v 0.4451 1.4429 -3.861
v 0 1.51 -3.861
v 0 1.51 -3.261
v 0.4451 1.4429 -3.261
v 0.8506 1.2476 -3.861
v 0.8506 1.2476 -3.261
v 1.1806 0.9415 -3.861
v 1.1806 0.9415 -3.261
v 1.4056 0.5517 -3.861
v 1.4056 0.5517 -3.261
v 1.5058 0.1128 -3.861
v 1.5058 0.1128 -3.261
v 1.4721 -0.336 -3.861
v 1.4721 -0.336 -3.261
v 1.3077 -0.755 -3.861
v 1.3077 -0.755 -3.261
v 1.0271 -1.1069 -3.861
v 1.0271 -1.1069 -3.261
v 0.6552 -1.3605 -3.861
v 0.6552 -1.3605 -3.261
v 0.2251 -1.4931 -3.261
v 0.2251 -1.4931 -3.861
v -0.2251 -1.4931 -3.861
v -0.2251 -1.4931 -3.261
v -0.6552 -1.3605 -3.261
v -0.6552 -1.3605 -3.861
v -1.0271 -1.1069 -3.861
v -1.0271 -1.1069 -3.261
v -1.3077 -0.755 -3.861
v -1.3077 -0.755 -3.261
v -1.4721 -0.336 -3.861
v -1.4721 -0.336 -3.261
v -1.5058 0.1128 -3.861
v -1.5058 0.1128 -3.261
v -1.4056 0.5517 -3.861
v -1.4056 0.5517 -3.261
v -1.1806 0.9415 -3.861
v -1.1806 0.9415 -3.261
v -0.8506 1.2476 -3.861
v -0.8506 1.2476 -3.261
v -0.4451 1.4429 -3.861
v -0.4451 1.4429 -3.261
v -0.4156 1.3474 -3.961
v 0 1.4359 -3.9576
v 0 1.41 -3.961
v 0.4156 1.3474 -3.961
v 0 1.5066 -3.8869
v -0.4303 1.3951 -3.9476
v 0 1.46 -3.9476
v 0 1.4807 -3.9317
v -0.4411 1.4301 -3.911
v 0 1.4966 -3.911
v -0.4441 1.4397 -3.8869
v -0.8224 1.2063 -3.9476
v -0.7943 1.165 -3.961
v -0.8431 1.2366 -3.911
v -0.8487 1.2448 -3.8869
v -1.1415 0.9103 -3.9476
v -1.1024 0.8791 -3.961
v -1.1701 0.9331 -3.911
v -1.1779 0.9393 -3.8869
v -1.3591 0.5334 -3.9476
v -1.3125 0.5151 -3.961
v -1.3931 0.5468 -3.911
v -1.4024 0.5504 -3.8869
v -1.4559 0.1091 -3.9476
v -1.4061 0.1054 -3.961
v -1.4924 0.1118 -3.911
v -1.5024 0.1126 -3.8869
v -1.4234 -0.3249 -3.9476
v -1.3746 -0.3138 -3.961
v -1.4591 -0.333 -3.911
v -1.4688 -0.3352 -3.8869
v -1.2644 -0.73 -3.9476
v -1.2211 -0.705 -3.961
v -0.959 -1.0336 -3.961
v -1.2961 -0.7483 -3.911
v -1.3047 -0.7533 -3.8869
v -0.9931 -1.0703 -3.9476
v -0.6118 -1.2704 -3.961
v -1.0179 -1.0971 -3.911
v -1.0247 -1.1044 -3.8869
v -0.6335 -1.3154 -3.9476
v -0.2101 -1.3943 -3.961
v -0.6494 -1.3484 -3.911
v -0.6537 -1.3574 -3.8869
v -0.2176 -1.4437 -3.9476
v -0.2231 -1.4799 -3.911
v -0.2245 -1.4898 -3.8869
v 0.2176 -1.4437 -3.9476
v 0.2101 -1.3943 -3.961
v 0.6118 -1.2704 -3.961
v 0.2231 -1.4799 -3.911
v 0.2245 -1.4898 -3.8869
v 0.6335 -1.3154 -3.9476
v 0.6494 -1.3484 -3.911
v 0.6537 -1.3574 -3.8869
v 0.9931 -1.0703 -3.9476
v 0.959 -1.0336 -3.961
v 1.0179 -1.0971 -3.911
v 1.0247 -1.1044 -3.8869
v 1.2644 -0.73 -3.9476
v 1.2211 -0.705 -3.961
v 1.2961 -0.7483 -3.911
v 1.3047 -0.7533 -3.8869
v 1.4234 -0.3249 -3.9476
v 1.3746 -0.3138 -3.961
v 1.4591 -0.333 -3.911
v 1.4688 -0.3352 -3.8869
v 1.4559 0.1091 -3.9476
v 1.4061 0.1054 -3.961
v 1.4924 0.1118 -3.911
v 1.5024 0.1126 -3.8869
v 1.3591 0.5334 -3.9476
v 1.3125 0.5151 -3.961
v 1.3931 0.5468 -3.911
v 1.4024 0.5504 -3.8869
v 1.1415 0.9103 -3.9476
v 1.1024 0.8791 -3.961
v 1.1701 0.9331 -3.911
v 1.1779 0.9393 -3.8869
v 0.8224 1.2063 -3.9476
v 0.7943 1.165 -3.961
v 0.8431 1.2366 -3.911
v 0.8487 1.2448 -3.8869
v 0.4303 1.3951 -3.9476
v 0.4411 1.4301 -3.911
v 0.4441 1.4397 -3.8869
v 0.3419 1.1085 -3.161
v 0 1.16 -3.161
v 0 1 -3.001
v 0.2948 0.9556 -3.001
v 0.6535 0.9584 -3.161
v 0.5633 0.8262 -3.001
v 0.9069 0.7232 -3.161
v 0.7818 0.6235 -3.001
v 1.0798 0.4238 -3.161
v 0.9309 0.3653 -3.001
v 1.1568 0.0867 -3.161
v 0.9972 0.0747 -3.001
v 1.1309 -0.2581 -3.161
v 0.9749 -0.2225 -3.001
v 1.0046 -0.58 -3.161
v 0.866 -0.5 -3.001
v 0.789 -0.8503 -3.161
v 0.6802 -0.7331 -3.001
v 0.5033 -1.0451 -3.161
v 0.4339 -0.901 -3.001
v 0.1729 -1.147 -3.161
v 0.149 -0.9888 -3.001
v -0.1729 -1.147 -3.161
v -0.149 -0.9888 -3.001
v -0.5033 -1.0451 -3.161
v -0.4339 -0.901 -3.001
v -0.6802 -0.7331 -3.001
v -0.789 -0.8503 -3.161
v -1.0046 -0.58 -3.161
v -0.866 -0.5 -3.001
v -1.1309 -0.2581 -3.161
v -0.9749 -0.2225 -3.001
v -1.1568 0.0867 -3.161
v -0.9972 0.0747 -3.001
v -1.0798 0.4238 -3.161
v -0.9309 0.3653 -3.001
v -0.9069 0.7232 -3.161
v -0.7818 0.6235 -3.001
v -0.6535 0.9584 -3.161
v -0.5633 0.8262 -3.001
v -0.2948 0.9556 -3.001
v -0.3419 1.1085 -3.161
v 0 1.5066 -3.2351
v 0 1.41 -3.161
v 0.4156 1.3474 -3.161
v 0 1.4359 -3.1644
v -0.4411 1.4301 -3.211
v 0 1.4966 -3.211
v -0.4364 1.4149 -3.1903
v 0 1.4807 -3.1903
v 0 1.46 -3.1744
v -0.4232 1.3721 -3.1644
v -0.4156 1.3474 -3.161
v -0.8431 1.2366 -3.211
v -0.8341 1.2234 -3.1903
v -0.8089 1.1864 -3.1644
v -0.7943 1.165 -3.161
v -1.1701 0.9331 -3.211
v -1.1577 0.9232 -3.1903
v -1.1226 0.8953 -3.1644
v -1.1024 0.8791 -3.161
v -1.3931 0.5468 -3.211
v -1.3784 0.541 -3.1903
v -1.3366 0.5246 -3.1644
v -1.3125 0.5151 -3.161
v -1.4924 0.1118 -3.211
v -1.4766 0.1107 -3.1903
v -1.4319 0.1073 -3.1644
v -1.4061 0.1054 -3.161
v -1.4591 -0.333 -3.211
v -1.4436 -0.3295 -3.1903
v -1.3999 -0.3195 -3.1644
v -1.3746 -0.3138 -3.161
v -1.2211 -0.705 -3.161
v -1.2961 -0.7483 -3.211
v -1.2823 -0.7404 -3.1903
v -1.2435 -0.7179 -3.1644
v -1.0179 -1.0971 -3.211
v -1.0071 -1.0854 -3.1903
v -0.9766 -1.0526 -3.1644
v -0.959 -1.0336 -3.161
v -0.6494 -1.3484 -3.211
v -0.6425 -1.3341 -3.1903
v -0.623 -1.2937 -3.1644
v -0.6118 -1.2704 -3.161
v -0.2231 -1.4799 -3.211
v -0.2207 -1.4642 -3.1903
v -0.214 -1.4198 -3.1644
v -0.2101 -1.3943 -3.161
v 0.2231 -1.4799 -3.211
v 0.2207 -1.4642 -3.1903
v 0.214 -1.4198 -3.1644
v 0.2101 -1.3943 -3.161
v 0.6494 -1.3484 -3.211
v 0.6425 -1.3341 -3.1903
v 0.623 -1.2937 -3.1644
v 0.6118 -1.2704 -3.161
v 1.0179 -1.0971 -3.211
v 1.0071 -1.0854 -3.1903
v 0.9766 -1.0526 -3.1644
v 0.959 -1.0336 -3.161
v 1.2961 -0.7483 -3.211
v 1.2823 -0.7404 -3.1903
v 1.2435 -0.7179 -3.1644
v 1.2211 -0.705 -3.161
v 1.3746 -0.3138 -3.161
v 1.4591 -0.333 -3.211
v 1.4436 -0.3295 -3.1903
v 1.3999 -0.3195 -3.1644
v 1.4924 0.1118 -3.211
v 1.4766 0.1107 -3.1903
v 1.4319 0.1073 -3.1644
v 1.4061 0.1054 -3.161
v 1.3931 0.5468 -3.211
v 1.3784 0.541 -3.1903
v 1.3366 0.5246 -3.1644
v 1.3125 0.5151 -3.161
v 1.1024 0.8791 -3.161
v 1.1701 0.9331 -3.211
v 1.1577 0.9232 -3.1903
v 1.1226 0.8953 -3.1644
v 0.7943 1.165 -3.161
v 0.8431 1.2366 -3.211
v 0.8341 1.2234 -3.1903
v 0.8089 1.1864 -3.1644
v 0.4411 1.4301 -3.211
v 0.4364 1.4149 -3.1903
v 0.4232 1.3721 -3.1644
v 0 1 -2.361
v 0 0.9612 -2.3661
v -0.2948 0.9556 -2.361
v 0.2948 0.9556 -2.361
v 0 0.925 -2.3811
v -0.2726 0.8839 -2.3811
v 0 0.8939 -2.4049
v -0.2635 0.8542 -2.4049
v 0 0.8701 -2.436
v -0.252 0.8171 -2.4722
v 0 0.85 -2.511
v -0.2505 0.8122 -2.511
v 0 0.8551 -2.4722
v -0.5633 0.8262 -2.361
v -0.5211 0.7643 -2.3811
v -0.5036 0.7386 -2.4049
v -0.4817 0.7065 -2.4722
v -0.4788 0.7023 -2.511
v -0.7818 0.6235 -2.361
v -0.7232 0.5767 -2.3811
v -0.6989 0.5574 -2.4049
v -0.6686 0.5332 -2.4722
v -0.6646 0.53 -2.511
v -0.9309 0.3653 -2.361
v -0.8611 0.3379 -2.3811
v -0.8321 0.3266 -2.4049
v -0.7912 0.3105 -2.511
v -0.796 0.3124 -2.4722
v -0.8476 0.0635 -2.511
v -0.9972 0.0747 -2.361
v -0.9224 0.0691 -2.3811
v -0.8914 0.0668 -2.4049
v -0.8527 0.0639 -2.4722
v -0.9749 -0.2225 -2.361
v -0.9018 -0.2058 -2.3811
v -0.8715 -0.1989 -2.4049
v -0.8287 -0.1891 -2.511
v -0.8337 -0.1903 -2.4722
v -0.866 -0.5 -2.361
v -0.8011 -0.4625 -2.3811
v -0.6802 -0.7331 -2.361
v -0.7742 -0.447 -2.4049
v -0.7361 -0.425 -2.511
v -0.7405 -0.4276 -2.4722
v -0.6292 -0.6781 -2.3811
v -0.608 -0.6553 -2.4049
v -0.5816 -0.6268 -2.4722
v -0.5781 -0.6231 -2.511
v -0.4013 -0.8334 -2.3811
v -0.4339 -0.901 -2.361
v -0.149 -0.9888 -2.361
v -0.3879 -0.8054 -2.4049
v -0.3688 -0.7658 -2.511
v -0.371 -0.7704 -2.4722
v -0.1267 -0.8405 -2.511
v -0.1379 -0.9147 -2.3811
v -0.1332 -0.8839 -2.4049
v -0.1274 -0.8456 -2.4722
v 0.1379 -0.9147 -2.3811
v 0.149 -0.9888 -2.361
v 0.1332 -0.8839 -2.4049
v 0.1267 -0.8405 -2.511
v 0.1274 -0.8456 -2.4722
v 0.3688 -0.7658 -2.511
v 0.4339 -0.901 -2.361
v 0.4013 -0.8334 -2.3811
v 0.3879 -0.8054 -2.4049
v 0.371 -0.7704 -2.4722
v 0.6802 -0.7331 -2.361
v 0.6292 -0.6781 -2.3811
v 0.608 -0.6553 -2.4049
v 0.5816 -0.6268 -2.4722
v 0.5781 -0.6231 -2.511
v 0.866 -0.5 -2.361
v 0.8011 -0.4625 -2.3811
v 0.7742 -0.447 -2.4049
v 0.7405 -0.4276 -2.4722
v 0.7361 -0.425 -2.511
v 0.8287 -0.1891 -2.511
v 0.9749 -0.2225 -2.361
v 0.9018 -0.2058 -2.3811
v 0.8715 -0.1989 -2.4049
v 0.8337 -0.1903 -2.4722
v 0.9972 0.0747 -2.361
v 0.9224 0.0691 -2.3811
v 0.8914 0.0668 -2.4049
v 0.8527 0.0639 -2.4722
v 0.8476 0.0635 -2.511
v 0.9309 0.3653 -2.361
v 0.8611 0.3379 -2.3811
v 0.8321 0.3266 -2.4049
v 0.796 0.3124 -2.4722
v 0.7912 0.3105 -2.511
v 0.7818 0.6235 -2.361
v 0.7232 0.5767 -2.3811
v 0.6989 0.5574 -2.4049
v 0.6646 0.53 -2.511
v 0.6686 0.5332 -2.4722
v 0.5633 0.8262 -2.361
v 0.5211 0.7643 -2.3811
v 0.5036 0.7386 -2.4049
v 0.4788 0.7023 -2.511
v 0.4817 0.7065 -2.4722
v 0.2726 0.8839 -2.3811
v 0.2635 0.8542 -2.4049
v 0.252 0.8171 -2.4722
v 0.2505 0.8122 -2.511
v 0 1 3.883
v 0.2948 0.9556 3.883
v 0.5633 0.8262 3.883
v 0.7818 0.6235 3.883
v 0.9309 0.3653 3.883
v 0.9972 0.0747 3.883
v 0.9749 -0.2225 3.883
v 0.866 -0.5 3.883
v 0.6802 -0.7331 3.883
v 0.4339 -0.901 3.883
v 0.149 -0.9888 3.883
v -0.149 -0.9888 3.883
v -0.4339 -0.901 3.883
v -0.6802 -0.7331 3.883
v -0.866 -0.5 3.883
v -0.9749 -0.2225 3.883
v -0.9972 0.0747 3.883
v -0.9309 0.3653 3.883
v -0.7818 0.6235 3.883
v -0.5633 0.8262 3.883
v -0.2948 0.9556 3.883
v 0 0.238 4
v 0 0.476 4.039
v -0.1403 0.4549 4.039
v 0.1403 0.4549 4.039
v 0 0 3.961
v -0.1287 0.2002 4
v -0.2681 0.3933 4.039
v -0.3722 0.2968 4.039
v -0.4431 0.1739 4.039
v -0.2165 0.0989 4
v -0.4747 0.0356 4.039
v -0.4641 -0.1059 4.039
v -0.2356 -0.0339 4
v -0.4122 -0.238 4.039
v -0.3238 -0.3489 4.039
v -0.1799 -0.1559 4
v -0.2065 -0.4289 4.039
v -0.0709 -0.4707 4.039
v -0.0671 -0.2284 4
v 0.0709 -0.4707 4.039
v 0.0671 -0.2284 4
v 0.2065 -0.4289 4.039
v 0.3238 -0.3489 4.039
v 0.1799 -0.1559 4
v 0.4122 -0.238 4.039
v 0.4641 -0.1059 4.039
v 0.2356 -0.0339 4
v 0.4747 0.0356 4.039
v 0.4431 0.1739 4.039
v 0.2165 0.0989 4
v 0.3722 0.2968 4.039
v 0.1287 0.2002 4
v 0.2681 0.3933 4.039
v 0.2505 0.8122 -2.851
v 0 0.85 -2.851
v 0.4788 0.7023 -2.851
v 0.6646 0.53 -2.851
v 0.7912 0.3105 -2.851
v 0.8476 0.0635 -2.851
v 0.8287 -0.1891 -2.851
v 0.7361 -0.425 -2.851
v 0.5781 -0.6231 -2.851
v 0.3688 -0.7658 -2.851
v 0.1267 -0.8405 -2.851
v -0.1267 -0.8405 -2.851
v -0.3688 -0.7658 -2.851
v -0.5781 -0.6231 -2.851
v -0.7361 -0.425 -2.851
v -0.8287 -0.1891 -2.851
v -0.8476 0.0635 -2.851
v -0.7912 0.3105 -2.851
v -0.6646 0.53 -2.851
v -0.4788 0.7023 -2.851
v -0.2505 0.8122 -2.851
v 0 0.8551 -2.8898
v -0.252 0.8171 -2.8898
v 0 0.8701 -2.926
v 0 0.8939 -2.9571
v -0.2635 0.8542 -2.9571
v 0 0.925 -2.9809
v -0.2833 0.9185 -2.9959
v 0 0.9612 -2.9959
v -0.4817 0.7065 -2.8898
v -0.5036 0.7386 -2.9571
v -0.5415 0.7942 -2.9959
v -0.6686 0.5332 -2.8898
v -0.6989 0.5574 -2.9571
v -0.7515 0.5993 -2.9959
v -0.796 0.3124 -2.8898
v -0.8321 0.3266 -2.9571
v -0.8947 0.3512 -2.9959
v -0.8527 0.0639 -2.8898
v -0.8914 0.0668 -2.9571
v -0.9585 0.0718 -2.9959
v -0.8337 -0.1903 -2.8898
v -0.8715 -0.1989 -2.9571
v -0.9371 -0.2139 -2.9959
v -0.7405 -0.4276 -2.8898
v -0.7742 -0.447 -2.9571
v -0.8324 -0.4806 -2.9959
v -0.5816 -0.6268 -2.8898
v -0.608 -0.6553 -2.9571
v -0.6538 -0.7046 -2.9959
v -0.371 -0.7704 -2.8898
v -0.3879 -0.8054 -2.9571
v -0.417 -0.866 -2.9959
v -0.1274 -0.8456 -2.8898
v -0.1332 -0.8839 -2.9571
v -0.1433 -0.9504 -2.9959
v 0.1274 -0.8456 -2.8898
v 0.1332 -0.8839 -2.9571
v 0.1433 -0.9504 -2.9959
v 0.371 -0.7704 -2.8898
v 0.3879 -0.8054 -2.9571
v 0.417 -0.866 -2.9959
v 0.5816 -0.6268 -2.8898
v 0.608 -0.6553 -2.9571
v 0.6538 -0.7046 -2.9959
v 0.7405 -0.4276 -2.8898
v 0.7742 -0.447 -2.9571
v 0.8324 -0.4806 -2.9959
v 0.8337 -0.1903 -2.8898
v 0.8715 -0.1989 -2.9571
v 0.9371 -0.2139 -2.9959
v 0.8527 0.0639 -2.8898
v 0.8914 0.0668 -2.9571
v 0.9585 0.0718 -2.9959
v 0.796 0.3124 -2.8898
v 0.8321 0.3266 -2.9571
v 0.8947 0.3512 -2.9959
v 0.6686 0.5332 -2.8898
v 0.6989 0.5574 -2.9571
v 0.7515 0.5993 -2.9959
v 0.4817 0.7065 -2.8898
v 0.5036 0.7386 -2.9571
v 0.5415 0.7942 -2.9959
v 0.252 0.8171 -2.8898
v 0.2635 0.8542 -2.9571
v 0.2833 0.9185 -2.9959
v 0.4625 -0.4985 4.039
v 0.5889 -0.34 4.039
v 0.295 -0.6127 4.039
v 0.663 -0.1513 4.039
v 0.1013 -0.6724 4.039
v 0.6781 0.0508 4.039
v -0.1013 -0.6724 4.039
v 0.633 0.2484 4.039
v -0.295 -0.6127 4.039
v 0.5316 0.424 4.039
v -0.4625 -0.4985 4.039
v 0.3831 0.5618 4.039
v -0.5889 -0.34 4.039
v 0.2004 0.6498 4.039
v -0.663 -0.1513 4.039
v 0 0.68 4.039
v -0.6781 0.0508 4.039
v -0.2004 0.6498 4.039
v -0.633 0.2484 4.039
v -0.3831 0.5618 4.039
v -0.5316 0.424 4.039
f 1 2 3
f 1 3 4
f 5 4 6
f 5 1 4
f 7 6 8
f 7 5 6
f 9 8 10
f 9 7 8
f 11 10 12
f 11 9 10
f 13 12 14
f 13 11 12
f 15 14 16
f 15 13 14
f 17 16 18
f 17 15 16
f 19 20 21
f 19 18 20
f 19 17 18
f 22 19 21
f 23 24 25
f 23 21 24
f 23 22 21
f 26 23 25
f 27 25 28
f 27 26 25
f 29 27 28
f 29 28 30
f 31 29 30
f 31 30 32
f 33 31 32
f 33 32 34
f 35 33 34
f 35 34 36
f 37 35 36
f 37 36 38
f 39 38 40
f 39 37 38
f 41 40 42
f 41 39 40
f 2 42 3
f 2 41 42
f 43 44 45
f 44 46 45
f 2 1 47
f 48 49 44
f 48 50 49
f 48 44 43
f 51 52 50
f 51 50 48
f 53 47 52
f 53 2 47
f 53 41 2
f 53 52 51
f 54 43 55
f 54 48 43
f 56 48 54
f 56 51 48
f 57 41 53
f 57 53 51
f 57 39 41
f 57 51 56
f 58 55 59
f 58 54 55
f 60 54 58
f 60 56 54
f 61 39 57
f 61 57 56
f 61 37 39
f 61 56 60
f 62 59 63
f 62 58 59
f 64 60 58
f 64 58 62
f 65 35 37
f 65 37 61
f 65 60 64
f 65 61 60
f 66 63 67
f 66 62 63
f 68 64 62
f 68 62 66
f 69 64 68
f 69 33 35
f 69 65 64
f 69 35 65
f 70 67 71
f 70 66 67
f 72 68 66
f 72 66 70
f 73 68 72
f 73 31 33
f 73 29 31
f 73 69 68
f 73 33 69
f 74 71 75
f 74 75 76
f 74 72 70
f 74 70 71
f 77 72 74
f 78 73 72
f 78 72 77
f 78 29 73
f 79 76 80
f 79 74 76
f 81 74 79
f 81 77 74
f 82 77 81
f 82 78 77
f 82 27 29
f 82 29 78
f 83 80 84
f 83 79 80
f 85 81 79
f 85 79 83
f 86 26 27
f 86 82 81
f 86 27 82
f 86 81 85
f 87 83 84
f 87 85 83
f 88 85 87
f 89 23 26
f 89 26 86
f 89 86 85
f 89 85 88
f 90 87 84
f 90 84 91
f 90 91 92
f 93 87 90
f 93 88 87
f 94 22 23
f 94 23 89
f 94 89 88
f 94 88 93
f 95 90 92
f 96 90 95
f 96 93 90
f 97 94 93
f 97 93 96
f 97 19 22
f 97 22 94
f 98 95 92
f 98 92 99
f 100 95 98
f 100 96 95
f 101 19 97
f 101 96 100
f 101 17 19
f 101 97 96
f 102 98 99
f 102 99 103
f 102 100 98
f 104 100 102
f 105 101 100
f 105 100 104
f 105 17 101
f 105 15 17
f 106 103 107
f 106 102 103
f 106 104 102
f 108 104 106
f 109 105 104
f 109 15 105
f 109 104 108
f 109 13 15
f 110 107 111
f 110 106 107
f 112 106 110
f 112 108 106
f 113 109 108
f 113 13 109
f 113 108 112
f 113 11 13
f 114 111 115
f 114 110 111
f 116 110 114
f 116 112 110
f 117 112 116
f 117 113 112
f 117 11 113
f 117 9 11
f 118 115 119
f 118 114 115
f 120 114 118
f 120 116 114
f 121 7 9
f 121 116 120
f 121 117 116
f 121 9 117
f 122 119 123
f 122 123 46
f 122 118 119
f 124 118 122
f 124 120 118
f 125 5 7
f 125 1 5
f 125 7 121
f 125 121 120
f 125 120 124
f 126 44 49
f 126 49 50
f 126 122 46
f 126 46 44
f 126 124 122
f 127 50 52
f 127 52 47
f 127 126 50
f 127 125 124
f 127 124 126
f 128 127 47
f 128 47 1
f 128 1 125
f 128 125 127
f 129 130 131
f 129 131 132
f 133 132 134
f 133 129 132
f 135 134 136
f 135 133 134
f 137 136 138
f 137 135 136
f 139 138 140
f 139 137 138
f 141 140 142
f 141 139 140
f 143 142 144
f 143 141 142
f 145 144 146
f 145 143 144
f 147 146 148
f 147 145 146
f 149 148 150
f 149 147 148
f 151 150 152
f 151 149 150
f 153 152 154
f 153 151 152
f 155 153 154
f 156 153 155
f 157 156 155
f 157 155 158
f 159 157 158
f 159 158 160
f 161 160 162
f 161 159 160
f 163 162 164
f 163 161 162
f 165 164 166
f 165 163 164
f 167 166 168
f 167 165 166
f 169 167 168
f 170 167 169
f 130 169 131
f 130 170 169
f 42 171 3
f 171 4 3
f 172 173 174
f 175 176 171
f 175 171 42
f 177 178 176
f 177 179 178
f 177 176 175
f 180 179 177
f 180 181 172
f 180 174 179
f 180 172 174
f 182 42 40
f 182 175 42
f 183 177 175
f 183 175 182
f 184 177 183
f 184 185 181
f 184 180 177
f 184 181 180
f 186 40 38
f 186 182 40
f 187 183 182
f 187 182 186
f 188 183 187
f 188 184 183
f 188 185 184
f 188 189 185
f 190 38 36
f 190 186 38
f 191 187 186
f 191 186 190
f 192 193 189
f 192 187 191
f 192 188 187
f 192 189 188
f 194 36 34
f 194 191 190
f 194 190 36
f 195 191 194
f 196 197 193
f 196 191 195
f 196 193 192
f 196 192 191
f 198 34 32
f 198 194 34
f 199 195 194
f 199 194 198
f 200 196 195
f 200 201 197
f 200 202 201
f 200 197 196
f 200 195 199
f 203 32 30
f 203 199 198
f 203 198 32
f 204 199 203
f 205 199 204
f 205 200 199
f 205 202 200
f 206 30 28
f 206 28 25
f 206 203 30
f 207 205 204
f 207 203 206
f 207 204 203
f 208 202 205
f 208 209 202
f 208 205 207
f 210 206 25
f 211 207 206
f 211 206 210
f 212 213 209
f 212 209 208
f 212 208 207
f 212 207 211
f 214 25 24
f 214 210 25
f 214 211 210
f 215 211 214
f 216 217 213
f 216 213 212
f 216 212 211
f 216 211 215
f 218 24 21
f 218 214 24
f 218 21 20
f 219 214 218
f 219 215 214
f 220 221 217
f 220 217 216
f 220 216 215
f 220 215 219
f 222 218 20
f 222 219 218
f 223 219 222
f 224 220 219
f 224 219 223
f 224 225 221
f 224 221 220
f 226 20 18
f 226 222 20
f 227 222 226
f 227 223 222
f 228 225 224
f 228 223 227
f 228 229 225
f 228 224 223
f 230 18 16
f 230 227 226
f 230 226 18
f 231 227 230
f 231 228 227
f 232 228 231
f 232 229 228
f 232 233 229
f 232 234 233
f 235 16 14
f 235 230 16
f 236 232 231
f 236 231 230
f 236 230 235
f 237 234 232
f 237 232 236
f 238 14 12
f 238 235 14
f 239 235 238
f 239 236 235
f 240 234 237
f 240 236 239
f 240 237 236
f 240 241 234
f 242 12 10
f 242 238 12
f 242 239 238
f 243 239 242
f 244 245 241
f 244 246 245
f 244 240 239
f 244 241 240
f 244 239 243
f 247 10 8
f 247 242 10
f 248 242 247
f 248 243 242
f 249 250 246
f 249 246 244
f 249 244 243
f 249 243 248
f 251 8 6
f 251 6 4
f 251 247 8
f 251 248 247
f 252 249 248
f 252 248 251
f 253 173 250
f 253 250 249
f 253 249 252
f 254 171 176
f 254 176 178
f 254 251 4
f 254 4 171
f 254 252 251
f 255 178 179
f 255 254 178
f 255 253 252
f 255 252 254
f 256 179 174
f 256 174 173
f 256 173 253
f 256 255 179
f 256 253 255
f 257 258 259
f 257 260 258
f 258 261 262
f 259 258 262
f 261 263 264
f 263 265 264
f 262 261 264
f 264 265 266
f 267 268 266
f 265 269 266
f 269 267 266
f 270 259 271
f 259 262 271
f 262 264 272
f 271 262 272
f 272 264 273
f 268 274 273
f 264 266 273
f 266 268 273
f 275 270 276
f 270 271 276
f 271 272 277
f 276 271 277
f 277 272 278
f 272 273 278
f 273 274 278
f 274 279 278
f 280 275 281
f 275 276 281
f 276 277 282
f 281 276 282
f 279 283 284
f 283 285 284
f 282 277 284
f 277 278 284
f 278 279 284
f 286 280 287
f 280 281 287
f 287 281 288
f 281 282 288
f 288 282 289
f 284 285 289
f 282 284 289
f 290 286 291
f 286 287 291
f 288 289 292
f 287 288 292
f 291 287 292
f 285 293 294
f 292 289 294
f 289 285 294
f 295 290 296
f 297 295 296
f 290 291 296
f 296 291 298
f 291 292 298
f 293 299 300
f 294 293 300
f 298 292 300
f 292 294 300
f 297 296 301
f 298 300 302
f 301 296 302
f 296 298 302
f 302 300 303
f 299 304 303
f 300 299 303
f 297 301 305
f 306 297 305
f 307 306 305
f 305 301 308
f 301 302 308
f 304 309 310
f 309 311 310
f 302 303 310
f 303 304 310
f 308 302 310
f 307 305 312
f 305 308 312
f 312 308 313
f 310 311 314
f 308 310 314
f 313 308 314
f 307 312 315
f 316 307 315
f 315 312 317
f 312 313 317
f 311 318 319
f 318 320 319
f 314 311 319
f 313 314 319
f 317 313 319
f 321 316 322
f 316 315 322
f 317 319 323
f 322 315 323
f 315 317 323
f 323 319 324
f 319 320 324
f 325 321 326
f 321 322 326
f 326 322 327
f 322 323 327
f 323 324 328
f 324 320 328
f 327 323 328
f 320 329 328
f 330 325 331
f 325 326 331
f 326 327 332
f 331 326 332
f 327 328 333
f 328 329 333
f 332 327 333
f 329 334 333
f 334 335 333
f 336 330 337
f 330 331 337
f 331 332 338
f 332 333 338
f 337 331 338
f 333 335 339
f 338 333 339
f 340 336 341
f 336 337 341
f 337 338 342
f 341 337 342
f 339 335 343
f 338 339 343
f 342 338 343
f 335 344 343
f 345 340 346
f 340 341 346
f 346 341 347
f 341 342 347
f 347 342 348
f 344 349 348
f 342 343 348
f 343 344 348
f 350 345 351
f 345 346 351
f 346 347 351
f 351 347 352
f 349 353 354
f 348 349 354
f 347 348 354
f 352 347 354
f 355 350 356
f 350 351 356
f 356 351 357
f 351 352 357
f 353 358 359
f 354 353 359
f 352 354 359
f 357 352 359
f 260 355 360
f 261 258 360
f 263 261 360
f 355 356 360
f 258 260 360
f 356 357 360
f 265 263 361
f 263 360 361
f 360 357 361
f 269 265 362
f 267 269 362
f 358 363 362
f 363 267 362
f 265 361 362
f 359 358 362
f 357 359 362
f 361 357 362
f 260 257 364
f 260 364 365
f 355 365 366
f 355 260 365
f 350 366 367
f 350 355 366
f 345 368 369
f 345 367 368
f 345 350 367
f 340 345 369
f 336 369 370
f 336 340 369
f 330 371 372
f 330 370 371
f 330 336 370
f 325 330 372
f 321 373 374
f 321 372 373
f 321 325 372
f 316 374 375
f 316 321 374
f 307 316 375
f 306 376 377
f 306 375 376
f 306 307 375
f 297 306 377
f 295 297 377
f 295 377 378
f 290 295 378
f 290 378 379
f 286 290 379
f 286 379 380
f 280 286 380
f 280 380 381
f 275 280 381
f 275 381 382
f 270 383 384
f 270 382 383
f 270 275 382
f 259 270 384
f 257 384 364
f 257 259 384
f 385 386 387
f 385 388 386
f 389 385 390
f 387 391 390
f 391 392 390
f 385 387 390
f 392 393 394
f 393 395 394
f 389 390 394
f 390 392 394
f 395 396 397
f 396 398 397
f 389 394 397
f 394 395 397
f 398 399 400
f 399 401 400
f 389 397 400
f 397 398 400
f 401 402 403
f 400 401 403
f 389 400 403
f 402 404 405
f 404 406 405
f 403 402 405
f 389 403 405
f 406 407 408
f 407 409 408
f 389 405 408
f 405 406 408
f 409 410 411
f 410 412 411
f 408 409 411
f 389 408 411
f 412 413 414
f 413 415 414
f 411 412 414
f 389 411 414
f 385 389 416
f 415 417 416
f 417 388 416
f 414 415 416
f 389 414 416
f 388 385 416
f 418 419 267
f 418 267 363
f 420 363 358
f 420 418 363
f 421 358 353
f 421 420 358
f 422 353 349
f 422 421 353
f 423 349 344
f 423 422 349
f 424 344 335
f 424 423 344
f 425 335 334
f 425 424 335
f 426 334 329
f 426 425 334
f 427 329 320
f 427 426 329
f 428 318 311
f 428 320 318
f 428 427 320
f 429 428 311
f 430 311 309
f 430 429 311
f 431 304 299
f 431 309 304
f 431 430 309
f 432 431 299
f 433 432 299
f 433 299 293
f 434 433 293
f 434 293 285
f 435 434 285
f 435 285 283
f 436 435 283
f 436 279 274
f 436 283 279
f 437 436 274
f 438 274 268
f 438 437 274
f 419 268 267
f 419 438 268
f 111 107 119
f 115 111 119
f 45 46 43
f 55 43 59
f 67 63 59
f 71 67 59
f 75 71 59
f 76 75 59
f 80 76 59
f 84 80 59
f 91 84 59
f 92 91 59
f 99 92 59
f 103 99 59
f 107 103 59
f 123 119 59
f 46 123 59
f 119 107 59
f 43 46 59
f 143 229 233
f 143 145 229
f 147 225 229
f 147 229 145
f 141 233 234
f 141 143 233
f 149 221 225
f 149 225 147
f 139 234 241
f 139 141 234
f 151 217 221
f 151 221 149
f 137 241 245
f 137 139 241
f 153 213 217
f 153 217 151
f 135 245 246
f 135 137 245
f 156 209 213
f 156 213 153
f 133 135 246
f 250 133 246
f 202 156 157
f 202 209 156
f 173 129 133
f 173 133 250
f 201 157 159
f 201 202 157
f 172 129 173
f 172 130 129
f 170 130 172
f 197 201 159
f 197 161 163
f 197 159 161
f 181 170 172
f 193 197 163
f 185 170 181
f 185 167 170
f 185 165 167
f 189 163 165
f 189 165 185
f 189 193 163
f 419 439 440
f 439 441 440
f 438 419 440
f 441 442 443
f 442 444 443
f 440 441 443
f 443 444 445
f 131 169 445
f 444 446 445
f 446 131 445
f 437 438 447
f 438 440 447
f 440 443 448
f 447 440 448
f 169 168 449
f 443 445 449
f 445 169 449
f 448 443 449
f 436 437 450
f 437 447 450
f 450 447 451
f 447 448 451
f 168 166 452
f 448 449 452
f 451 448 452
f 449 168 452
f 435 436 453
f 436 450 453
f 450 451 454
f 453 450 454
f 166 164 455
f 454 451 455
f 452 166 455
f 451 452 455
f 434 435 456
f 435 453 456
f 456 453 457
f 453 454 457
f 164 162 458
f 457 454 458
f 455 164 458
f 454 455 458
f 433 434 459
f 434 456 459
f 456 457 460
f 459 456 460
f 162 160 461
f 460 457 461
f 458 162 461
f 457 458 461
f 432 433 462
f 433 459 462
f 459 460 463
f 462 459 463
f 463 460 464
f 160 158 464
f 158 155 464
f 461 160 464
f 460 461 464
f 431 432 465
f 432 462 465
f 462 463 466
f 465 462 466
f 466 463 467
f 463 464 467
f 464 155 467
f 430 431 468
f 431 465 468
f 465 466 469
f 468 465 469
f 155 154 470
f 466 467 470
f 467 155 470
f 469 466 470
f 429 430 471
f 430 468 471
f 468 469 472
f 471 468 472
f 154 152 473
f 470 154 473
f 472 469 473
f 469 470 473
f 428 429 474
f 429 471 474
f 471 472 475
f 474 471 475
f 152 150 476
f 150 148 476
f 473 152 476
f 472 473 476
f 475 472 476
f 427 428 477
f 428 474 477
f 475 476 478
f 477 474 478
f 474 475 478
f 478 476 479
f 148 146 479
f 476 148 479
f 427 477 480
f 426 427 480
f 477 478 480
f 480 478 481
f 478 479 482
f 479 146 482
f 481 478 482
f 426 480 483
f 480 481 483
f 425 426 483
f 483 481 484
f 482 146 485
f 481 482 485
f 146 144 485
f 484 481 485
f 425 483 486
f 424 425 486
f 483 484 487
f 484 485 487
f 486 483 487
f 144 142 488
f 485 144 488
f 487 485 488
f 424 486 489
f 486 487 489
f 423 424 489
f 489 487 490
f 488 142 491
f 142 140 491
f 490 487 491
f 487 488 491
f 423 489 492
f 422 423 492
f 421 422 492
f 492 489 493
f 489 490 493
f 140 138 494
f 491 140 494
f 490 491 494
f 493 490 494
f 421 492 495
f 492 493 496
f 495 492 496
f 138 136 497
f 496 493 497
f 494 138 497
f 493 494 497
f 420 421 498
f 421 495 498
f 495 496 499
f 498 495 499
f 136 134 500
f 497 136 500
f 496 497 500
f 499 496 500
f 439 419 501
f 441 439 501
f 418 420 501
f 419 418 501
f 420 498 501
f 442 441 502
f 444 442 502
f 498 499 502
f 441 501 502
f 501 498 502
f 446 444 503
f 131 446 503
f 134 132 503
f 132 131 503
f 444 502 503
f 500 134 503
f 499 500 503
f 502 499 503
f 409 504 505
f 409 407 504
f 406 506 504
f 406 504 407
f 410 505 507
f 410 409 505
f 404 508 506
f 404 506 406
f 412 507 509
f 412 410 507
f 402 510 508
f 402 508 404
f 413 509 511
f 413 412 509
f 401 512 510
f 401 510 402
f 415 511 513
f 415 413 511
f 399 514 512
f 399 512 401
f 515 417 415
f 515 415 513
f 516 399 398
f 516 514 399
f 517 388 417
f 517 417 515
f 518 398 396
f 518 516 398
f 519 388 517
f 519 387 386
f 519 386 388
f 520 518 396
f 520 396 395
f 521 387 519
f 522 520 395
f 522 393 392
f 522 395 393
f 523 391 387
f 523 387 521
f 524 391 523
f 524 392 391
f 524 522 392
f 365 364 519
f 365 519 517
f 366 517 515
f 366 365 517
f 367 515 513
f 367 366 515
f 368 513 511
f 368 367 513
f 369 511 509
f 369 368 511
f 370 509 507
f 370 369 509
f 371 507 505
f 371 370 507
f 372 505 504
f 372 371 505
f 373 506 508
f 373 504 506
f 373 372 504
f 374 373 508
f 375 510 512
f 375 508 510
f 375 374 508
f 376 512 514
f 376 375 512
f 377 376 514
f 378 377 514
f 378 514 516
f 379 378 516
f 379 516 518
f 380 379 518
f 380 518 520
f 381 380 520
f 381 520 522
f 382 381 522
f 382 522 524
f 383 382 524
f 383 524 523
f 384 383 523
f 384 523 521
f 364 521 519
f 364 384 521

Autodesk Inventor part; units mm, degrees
ref_plane "YZ Plane" through (0, 0, 0) normal (1, 0, 0) x (0, 1, 0)
ref_plane "XZ Plane" through (0, 0, 0) normal (0, 1, 0) x (-1, 0, 0)
ref_plane "XY Plane" through (0, 0, 0) normal (0, 0, 1) x (1, 0, 0)
sketch "Sketch1" plane through (0, 0, 0) normal (1, 0, 0) x (0, 1, 0)
  line L0 (0.68, 4.039) -> (1, 3.883)
  line L1 (1, 3.883) -> (1, -2.361)
  line L2 (1.16, -3.161) -> (1.41, -3.161)
  line L3 (1.51, -3.261) -> (1.51, -3.861)
  line L4 (1.41, -3.961) -> (0, -3.961)
  line L5 (0, -3.961) -> (0, 3.961)
  arc A0 (1.51, -3.261) -> (1.41, -3.161) centre (1.41, -3.261) ccw
  arc A1 (1.41, -3.961) -> (1.51, -3.861) centre (1.41, -3.861) ccw
  line L6 (0.68, 4.039) -> (0.476, 4.039)
  line L7 (0.476, 4.039) -> (0, 3.961)
  line L8 (1.16, -3.161) -> (1, -3.001)
  arc A2 (1, -2.361) -> (0.85, -2.511) centre (1, -2.511) ccw
  line L9 (0.85, -2.511) -> (0.85, -2.851)
  arc A3 (0.85, -2.851) -> (1, -3.001) centre (1, -2.851) ccw
  point P0 (0, 0)
  point P1 (1.51, -3.161)
  point P2 (1.51, -3.961)
  point P3 (0, 0)
  dimension "d0" = 2
  dimension "d2" = 3.02
  dimension "d4" = 1.36
  dimension "d6" = 0.8
  dimension "d8" = 0.1
  dimension "d9" = 0.156
  dimension "d11" = 8
  dimension "d12" = 0.952
  dimension "d13" = 0.078
  dimension "d14" = 2.32
  dimension "d15" = 135
  dimension "d16" = 0.8
  dimension "d17" = 1.7
revolve "Revolution1" add sketch "Sketch1" angle 360 about axis through (0, 0, -3.961) along (0, 0, 1)
properties part number "Pin_Headed-2x8mm" material "Stainless Steel"
